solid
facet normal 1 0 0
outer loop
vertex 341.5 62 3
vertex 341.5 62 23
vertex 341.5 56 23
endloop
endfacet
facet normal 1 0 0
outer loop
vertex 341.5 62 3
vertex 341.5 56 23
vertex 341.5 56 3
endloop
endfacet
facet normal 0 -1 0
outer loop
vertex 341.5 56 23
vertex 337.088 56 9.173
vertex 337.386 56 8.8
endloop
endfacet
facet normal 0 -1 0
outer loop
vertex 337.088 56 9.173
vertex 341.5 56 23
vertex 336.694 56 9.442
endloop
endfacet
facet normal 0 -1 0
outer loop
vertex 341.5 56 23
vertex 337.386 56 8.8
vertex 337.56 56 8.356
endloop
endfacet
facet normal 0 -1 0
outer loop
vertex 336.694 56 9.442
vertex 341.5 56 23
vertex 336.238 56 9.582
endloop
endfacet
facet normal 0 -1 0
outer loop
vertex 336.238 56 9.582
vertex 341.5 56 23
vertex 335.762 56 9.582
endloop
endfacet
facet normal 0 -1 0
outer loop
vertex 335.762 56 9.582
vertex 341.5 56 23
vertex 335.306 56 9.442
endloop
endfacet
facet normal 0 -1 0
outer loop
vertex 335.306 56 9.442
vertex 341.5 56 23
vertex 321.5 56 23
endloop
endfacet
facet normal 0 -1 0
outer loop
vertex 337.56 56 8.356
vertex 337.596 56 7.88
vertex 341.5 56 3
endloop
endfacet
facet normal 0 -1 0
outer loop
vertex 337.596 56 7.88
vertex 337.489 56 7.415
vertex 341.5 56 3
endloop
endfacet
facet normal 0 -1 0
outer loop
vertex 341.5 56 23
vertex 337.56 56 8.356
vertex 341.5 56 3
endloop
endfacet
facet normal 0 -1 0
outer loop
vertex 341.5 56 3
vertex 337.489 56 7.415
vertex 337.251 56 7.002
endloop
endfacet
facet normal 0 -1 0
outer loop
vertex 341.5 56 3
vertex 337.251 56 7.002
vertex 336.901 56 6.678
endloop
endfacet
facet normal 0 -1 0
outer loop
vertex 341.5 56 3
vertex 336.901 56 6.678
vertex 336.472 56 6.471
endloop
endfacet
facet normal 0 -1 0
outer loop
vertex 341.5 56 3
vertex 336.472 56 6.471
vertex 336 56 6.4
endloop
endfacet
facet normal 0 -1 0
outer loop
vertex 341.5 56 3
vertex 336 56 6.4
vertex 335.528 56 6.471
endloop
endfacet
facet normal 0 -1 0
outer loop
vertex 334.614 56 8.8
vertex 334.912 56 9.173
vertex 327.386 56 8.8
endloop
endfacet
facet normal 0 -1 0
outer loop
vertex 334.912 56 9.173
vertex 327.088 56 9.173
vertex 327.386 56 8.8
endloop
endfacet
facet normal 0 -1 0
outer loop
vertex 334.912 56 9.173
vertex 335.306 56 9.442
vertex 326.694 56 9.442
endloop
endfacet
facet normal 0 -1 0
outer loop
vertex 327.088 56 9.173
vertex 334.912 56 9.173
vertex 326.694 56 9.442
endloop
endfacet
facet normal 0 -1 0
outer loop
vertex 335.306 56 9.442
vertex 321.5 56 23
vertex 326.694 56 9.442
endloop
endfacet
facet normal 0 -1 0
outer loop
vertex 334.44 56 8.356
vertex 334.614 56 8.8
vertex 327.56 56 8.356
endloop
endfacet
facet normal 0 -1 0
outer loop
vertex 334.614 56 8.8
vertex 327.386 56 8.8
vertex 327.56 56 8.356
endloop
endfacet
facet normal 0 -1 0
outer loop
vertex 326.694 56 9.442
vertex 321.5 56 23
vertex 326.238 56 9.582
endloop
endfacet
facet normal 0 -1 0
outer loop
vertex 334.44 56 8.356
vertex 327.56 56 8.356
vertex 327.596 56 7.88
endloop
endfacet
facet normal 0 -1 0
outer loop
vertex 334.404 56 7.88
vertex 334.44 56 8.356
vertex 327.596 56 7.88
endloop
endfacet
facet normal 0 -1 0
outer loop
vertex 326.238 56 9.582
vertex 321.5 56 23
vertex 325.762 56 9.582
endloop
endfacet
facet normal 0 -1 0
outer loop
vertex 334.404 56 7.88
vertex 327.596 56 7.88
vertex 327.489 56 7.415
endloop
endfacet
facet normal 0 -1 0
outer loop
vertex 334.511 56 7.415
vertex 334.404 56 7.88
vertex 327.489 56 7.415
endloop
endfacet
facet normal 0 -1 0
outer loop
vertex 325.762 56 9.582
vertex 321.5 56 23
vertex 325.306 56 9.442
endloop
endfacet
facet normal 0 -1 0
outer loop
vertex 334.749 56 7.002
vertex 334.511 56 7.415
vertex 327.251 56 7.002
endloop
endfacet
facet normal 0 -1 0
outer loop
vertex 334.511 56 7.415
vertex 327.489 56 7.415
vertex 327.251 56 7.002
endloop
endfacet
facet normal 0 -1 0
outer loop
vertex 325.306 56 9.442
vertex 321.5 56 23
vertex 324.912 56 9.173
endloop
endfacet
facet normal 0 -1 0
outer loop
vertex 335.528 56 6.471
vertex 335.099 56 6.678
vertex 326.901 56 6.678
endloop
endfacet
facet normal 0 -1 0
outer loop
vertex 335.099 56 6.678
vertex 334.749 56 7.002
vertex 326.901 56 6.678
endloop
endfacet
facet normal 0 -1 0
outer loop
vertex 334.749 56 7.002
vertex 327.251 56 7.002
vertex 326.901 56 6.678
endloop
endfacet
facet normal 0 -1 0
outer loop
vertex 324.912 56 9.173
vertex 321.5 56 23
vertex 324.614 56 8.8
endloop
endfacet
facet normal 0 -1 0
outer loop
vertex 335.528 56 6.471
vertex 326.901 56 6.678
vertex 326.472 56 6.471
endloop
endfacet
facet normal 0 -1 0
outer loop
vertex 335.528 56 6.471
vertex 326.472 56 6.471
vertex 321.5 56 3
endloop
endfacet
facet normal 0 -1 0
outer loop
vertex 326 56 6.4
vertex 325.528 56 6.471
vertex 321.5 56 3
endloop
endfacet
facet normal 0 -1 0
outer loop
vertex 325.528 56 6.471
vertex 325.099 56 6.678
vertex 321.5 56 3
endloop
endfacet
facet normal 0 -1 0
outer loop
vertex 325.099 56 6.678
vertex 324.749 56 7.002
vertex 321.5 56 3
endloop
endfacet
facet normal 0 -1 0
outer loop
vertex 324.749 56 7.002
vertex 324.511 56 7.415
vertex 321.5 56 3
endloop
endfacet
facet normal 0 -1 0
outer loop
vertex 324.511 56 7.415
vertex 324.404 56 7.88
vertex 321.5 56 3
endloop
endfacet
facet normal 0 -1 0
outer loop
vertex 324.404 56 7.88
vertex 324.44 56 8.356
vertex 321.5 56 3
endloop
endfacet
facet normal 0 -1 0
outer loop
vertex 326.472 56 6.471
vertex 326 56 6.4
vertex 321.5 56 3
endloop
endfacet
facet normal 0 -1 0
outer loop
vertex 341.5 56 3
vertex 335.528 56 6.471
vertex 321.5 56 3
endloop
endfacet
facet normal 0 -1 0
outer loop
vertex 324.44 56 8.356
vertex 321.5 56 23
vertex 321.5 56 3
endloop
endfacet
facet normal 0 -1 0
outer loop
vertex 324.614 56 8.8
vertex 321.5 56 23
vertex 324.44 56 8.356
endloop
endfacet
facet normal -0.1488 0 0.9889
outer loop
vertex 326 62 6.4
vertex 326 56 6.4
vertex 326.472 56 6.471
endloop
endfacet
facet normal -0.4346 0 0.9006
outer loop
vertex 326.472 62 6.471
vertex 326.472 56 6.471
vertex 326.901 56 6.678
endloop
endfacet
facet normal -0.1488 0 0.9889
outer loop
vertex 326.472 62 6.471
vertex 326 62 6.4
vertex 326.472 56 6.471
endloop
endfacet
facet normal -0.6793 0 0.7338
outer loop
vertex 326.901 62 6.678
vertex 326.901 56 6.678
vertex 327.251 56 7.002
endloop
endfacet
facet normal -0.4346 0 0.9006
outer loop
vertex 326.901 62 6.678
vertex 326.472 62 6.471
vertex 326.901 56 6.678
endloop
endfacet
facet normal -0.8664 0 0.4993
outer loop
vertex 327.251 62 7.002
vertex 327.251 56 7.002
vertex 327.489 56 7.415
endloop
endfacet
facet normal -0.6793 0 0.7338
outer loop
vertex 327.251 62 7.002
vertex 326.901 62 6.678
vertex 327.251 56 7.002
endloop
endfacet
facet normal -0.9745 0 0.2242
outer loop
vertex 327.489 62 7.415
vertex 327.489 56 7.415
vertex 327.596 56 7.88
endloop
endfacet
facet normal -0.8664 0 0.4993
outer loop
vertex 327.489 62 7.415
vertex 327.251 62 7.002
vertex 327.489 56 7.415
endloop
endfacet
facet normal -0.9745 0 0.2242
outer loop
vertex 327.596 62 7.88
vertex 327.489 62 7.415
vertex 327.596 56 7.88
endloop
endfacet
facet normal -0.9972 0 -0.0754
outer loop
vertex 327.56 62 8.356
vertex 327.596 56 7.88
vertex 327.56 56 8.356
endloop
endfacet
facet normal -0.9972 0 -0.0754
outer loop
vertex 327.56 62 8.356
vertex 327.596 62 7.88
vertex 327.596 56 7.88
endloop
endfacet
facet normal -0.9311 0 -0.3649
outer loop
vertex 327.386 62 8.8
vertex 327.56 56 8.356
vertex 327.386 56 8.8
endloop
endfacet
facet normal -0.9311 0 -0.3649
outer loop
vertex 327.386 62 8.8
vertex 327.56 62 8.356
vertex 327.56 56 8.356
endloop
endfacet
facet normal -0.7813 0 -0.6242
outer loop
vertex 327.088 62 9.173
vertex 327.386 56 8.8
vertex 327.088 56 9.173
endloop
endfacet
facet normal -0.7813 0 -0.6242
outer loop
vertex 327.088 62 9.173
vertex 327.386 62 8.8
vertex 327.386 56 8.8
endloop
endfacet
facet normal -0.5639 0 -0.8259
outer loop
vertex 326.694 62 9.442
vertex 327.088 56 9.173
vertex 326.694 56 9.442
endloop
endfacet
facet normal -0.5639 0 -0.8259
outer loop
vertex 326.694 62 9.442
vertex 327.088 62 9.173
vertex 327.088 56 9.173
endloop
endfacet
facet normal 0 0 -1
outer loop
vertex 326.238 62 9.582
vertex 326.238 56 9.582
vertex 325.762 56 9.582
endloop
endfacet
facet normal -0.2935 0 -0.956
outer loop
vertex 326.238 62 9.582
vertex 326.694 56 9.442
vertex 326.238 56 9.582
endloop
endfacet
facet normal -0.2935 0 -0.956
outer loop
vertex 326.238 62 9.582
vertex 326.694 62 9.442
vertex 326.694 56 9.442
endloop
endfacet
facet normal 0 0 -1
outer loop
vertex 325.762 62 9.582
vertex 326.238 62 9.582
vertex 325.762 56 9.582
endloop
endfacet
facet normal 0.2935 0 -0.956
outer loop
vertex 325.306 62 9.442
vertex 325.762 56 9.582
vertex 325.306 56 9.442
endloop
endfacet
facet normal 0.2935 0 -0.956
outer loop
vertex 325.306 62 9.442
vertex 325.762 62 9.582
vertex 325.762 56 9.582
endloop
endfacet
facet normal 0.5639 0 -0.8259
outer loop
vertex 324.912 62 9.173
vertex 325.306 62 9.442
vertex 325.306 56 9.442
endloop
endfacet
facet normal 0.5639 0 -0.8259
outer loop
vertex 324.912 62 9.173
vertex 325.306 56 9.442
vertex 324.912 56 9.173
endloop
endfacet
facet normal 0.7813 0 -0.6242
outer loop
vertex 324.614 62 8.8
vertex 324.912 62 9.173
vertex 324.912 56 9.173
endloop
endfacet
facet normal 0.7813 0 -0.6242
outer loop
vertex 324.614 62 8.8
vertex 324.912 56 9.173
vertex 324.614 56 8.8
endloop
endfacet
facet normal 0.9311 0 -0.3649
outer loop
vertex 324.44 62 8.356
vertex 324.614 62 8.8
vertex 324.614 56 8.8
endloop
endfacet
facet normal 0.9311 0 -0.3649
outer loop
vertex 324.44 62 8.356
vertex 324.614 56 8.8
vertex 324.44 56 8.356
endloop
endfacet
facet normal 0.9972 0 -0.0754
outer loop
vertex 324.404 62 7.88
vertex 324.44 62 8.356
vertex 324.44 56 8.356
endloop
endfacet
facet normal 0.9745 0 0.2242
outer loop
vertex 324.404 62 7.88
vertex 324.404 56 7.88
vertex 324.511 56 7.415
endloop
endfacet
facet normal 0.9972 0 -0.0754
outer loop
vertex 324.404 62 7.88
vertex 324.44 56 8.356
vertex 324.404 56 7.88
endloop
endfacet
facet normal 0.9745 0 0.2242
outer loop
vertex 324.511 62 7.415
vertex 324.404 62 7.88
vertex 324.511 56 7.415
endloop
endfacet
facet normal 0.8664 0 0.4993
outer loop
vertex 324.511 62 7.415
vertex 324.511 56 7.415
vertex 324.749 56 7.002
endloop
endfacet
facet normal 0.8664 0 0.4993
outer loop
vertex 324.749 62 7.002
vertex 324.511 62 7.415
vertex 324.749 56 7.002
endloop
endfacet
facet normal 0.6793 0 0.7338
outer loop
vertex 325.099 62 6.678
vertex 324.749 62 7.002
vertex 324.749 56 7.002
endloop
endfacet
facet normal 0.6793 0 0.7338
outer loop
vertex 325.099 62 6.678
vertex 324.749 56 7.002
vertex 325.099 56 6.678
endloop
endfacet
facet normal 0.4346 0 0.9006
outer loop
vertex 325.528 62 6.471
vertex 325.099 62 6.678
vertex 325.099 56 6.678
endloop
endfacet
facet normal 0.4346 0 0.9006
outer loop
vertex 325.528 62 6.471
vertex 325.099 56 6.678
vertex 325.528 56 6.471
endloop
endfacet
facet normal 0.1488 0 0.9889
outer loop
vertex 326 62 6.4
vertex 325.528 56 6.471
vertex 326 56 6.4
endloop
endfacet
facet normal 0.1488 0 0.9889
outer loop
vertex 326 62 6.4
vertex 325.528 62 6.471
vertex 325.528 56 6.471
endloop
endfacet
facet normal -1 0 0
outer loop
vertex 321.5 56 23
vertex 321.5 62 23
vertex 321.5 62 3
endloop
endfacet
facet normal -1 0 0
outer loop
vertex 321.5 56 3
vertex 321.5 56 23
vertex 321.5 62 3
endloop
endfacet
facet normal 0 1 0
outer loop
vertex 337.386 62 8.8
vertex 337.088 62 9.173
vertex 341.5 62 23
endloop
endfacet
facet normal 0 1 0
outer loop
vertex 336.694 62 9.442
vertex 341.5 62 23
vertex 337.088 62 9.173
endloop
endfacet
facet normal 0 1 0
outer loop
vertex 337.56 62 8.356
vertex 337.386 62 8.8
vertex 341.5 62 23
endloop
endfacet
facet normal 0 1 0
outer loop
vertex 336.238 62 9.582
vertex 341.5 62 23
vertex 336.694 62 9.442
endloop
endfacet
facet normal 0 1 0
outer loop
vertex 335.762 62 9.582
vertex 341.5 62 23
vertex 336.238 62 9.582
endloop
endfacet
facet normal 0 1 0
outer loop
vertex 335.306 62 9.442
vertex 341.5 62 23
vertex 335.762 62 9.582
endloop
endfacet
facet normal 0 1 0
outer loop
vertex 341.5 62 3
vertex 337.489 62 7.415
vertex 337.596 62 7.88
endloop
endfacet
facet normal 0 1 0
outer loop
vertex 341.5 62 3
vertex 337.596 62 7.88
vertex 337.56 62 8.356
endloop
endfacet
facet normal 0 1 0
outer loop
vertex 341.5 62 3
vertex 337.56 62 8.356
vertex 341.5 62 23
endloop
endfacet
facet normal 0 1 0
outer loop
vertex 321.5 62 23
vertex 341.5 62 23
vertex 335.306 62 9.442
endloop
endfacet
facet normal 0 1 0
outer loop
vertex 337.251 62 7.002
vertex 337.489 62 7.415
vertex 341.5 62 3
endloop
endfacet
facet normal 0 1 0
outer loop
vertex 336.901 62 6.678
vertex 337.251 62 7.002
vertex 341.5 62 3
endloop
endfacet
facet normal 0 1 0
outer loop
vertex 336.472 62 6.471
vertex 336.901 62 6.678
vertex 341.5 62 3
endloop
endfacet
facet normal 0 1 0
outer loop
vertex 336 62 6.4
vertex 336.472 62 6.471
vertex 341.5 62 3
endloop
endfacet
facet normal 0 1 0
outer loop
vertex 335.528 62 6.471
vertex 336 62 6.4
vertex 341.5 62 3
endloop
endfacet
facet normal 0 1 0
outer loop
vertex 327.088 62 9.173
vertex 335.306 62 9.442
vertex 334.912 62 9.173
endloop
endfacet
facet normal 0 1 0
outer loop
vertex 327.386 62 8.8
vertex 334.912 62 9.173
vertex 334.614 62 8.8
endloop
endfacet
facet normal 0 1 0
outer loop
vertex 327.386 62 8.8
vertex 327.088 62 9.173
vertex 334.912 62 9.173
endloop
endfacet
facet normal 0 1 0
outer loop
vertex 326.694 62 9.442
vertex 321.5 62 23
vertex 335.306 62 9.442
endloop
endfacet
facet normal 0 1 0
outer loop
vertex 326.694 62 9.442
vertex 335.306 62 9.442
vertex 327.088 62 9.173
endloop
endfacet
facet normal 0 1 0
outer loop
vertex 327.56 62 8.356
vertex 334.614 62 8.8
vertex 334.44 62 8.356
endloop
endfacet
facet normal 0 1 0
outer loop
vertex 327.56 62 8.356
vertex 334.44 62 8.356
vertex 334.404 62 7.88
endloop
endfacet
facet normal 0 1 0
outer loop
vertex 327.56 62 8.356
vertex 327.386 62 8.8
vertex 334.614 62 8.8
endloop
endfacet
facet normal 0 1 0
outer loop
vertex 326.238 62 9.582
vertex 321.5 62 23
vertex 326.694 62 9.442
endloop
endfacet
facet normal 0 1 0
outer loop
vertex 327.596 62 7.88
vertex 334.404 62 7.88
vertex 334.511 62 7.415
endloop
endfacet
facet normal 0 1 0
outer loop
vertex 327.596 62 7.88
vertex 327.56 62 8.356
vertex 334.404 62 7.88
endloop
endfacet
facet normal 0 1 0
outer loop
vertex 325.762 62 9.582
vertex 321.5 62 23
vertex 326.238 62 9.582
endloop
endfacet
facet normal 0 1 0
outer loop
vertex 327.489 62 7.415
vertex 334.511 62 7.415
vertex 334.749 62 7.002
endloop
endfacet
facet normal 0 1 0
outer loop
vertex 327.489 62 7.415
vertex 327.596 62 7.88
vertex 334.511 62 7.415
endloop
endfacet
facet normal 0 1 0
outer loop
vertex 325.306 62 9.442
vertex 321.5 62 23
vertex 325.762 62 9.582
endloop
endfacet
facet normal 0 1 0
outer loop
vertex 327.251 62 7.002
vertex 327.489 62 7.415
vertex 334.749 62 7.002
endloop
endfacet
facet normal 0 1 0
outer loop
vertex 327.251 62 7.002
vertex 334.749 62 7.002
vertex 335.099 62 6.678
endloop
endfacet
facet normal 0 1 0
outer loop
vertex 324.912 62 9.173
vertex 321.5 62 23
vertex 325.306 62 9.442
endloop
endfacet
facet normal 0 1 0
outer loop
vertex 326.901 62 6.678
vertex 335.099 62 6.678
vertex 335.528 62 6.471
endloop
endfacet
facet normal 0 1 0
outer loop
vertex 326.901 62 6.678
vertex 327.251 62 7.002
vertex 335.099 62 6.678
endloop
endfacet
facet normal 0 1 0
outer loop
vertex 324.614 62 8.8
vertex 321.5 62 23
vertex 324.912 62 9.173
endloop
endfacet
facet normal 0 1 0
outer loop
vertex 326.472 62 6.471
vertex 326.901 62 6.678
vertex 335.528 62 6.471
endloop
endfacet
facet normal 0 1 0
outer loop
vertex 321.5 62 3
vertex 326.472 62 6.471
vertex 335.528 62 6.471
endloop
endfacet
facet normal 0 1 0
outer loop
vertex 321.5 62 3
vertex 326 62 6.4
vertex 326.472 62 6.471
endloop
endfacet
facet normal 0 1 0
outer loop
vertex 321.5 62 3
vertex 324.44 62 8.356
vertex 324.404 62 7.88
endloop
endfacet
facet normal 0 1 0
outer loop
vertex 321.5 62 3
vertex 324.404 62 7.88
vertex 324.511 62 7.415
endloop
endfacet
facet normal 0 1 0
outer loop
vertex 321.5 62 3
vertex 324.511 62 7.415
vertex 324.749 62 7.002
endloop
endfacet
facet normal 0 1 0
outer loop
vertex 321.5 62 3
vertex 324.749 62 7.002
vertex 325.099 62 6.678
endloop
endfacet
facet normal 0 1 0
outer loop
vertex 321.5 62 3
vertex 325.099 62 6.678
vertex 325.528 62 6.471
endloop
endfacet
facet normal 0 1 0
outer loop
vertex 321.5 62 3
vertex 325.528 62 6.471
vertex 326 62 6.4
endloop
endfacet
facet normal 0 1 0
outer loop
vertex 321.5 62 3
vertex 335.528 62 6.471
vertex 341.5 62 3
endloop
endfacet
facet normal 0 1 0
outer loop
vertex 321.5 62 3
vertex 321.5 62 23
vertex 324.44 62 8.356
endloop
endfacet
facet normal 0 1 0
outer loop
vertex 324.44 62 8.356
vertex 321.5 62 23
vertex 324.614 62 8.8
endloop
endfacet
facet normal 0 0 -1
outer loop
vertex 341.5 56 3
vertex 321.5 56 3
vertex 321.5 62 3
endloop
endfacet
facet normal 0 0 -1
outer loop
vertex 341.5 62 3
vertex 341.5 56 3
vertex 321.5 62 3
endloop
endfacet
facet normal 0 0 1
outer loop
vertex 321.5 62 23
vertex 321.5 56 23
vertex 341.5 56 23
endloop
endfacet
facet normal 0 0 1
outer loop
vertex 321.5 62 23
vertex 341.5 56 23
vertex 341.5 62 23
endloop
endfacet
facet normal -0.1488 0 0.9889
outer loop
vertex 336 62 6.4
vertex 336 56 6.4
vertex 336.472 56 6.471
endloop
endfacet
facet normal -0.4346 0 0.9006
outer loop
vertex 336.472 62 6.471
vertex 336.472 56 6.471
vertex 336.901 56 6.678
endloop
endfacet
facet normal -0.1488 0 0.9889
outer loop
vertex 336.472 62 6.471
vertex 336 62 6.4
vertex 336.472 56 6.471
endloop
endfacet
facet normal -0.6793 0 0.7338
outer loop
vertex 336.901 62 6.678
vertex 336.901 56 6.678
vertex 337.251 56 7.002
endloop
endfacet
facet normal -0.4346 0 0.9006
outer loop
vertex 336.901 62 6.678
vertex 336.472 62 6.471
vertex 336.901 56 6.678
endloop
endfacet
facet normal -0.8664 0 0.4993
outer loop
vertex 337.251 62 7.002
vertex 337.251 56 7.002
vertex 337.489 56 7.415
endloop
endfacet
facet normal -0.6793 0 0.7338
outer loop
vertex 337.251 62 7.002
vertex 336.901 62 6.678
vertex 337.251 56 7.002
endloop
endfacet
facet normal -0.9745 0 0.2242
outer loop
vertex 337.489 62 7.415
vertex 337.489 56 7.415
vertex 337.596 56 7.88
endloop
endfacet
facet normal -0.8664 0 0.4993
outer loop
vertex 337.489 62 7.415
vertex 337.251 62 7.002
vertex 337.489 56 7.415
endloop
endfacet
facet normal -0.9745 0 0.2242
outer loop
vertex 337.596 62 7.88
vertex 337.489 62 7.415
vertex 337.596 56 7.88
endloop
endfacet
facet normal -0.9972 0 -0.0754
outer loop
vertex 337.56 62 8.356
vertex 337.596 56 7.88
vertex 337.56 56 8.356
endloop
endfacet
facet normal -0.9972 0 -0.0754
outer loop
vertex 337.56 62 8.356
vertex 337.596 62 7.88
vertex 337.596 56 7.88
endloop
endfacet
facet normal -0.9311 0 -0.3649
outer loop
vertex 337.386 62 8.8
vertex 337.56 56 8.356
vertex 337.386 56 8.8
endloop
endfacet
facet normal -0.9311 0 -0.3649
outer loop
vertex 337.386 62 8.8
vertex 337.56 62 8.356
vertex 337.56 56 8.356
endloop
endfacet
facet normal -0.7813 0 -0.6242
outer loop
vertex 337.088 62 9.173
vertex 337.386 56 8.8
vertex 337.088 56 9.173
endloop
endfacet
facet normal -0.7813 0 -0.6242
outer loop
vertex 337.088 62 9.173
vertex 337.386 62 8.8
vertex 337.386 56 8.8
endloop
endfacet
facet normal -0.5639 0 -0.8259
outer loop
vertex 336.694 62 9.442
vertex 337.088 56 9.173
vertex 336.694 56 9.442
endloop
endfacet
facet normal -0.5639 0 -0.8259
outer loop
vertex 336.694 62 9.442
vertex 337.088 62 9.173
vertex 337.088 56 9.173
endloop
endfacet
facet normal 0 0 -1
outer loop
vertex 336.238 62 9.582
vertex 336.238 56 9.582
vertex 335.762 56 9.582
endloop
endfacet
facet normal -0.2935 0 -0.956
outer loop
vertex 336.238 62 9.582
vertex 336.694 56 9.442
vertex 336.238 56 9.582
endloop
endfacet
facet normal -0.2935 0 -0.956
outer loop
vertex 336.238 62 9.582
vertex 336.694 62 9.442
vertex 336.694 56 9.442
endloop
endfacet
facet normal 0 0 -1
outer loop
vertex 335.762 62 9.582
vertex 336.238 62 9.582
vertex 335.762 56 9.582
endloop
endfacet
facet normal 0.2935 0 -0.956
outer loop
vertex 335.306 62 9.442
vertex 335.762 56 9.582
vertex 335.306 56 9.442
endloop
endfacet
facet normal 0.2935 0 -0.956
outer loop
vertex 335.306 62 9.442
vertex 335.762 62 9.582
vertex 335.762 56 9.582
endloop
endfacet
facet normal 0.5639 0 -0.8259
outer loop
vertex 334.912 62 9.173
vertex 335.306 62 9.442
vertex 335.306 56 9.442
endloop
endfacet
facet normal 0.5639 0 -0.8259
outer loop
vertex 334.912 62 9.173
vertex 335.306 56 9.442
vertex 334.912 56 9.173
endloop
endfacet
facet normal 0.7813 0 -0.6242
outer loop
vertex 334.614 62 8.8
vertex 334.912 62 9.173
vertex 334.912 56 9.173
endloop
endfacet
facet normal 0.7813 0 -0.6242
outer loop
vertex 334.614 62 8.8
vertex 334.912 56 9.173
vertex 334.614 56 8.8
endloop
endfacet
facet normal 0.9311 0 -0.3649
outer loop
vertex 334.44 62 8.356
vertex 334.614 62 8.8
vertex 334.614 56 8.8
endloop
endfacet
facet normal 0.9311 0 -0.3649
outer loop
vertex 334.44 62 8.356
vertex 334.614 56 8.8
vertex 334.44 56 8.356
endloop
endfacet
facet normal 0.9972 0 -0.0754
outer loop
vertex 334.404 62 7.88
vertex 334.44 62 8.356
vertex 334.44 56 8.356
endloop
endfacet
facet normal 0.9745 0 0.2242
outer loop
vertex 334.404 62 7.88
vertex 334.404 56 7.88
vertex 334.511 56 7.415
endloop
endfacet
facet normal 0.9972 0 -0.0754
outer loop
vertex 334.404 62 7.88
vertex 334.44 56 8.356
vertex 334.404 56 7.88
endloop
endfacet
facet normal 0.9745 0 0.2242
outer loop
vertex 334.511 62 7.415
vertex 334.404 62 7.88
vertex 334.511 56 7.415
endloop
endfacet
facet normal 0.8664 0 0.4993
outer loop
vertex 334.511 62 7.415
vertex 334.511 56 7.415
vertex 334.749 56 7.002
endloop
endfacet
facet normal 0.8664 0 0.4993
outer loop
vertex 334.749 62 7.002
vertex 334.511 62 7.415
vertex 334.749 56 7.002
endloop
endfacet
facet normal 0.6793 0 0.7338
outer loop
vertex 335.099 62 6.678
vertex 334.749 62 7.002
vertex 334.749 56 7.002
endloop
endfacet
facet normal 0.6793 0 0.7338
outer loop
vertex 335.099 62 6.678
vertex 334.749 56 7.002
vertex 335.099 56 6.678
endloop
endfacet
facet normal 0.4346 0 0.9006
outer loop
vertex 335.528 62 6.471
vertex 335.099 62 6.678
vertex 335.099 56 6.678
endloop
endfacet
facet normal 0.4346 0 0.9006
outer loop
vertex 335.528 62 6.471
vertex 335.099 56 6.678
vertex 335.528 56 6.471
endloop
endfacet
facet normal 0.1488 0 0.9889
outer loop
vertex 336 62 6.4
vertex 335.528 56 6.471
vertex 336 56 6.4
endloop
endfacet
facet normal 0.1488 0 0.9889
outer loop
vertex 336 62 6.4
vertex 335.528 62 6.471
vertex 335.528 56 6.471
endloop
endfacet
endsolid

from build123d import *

# Parameters (mm, degrees)
CYLINDER110_R          = 1.6
CYLINDER110_DEPTH      = 10
CYLINDER111_R          = 1.6
CYLINDER111_DEPTH      = 10
BOX050_W               = 20
BOX050_H               = 6
BOX050_DEPTH           = 20
CUT058_PLACEMENT_ANGLE = 90


with BuildPart() as cylinder110:
    # Cylinder110 → Cylinder110 (new body)
    with BuildSketch(Plane(origin=(320, 26, 0), x_dir=(1, 0, 0), z_dir=(0, -1, 0))):
        Circle(CYLINDER110_R)
    extrude(amount=CYLINDER110_DEPTH)


with BuildPart() as fusion097:
    # Cylinder111 → Cylinder111 (new body)
    with BuildSketch(Plane(origin=(320, 26, 10), x_dir=(1, 0, 0), z_dir=(0, -1, 0))):
        Circle(CYLINDER111_R)
    extrude(amount=CYLINDER111_DEPTH)

    # Fusion097: union Cylinder110
    add(cylinder110.part)


with BuildPart() as fusion097_1:
    # Fusion097 placement: moved
    add(fusion097.part.moved(Location((15, -1.5, 6))))


with BuildPart() as cut058:
    # Box050 → Box050 (new body)
    with BuildSketch(Plane(origin=(320, 18.5, 1.5), x_dir=(1, 0, 0), z_dir=(0, 0, 1))):
        with Locations((10, 3)):
            Rectangle(BOX050_W, BOX050_H)
    extrude(amount=BOX050_DEPTH)

    # Cut058: cut Fusion097
    add(fusion097_1.part, mode=Mode.SUBTRACT)


with BuildPart() as cut058_1:
    # Cut058 placement: moved
    add(cut058.part.moved(Location((320, 37.5, 343))).rotate(Axis((320, 37.5, 343), (0, 1, 0)), CUT058_PLACEMENT_ANGLE))


solid = cut058_1.part
